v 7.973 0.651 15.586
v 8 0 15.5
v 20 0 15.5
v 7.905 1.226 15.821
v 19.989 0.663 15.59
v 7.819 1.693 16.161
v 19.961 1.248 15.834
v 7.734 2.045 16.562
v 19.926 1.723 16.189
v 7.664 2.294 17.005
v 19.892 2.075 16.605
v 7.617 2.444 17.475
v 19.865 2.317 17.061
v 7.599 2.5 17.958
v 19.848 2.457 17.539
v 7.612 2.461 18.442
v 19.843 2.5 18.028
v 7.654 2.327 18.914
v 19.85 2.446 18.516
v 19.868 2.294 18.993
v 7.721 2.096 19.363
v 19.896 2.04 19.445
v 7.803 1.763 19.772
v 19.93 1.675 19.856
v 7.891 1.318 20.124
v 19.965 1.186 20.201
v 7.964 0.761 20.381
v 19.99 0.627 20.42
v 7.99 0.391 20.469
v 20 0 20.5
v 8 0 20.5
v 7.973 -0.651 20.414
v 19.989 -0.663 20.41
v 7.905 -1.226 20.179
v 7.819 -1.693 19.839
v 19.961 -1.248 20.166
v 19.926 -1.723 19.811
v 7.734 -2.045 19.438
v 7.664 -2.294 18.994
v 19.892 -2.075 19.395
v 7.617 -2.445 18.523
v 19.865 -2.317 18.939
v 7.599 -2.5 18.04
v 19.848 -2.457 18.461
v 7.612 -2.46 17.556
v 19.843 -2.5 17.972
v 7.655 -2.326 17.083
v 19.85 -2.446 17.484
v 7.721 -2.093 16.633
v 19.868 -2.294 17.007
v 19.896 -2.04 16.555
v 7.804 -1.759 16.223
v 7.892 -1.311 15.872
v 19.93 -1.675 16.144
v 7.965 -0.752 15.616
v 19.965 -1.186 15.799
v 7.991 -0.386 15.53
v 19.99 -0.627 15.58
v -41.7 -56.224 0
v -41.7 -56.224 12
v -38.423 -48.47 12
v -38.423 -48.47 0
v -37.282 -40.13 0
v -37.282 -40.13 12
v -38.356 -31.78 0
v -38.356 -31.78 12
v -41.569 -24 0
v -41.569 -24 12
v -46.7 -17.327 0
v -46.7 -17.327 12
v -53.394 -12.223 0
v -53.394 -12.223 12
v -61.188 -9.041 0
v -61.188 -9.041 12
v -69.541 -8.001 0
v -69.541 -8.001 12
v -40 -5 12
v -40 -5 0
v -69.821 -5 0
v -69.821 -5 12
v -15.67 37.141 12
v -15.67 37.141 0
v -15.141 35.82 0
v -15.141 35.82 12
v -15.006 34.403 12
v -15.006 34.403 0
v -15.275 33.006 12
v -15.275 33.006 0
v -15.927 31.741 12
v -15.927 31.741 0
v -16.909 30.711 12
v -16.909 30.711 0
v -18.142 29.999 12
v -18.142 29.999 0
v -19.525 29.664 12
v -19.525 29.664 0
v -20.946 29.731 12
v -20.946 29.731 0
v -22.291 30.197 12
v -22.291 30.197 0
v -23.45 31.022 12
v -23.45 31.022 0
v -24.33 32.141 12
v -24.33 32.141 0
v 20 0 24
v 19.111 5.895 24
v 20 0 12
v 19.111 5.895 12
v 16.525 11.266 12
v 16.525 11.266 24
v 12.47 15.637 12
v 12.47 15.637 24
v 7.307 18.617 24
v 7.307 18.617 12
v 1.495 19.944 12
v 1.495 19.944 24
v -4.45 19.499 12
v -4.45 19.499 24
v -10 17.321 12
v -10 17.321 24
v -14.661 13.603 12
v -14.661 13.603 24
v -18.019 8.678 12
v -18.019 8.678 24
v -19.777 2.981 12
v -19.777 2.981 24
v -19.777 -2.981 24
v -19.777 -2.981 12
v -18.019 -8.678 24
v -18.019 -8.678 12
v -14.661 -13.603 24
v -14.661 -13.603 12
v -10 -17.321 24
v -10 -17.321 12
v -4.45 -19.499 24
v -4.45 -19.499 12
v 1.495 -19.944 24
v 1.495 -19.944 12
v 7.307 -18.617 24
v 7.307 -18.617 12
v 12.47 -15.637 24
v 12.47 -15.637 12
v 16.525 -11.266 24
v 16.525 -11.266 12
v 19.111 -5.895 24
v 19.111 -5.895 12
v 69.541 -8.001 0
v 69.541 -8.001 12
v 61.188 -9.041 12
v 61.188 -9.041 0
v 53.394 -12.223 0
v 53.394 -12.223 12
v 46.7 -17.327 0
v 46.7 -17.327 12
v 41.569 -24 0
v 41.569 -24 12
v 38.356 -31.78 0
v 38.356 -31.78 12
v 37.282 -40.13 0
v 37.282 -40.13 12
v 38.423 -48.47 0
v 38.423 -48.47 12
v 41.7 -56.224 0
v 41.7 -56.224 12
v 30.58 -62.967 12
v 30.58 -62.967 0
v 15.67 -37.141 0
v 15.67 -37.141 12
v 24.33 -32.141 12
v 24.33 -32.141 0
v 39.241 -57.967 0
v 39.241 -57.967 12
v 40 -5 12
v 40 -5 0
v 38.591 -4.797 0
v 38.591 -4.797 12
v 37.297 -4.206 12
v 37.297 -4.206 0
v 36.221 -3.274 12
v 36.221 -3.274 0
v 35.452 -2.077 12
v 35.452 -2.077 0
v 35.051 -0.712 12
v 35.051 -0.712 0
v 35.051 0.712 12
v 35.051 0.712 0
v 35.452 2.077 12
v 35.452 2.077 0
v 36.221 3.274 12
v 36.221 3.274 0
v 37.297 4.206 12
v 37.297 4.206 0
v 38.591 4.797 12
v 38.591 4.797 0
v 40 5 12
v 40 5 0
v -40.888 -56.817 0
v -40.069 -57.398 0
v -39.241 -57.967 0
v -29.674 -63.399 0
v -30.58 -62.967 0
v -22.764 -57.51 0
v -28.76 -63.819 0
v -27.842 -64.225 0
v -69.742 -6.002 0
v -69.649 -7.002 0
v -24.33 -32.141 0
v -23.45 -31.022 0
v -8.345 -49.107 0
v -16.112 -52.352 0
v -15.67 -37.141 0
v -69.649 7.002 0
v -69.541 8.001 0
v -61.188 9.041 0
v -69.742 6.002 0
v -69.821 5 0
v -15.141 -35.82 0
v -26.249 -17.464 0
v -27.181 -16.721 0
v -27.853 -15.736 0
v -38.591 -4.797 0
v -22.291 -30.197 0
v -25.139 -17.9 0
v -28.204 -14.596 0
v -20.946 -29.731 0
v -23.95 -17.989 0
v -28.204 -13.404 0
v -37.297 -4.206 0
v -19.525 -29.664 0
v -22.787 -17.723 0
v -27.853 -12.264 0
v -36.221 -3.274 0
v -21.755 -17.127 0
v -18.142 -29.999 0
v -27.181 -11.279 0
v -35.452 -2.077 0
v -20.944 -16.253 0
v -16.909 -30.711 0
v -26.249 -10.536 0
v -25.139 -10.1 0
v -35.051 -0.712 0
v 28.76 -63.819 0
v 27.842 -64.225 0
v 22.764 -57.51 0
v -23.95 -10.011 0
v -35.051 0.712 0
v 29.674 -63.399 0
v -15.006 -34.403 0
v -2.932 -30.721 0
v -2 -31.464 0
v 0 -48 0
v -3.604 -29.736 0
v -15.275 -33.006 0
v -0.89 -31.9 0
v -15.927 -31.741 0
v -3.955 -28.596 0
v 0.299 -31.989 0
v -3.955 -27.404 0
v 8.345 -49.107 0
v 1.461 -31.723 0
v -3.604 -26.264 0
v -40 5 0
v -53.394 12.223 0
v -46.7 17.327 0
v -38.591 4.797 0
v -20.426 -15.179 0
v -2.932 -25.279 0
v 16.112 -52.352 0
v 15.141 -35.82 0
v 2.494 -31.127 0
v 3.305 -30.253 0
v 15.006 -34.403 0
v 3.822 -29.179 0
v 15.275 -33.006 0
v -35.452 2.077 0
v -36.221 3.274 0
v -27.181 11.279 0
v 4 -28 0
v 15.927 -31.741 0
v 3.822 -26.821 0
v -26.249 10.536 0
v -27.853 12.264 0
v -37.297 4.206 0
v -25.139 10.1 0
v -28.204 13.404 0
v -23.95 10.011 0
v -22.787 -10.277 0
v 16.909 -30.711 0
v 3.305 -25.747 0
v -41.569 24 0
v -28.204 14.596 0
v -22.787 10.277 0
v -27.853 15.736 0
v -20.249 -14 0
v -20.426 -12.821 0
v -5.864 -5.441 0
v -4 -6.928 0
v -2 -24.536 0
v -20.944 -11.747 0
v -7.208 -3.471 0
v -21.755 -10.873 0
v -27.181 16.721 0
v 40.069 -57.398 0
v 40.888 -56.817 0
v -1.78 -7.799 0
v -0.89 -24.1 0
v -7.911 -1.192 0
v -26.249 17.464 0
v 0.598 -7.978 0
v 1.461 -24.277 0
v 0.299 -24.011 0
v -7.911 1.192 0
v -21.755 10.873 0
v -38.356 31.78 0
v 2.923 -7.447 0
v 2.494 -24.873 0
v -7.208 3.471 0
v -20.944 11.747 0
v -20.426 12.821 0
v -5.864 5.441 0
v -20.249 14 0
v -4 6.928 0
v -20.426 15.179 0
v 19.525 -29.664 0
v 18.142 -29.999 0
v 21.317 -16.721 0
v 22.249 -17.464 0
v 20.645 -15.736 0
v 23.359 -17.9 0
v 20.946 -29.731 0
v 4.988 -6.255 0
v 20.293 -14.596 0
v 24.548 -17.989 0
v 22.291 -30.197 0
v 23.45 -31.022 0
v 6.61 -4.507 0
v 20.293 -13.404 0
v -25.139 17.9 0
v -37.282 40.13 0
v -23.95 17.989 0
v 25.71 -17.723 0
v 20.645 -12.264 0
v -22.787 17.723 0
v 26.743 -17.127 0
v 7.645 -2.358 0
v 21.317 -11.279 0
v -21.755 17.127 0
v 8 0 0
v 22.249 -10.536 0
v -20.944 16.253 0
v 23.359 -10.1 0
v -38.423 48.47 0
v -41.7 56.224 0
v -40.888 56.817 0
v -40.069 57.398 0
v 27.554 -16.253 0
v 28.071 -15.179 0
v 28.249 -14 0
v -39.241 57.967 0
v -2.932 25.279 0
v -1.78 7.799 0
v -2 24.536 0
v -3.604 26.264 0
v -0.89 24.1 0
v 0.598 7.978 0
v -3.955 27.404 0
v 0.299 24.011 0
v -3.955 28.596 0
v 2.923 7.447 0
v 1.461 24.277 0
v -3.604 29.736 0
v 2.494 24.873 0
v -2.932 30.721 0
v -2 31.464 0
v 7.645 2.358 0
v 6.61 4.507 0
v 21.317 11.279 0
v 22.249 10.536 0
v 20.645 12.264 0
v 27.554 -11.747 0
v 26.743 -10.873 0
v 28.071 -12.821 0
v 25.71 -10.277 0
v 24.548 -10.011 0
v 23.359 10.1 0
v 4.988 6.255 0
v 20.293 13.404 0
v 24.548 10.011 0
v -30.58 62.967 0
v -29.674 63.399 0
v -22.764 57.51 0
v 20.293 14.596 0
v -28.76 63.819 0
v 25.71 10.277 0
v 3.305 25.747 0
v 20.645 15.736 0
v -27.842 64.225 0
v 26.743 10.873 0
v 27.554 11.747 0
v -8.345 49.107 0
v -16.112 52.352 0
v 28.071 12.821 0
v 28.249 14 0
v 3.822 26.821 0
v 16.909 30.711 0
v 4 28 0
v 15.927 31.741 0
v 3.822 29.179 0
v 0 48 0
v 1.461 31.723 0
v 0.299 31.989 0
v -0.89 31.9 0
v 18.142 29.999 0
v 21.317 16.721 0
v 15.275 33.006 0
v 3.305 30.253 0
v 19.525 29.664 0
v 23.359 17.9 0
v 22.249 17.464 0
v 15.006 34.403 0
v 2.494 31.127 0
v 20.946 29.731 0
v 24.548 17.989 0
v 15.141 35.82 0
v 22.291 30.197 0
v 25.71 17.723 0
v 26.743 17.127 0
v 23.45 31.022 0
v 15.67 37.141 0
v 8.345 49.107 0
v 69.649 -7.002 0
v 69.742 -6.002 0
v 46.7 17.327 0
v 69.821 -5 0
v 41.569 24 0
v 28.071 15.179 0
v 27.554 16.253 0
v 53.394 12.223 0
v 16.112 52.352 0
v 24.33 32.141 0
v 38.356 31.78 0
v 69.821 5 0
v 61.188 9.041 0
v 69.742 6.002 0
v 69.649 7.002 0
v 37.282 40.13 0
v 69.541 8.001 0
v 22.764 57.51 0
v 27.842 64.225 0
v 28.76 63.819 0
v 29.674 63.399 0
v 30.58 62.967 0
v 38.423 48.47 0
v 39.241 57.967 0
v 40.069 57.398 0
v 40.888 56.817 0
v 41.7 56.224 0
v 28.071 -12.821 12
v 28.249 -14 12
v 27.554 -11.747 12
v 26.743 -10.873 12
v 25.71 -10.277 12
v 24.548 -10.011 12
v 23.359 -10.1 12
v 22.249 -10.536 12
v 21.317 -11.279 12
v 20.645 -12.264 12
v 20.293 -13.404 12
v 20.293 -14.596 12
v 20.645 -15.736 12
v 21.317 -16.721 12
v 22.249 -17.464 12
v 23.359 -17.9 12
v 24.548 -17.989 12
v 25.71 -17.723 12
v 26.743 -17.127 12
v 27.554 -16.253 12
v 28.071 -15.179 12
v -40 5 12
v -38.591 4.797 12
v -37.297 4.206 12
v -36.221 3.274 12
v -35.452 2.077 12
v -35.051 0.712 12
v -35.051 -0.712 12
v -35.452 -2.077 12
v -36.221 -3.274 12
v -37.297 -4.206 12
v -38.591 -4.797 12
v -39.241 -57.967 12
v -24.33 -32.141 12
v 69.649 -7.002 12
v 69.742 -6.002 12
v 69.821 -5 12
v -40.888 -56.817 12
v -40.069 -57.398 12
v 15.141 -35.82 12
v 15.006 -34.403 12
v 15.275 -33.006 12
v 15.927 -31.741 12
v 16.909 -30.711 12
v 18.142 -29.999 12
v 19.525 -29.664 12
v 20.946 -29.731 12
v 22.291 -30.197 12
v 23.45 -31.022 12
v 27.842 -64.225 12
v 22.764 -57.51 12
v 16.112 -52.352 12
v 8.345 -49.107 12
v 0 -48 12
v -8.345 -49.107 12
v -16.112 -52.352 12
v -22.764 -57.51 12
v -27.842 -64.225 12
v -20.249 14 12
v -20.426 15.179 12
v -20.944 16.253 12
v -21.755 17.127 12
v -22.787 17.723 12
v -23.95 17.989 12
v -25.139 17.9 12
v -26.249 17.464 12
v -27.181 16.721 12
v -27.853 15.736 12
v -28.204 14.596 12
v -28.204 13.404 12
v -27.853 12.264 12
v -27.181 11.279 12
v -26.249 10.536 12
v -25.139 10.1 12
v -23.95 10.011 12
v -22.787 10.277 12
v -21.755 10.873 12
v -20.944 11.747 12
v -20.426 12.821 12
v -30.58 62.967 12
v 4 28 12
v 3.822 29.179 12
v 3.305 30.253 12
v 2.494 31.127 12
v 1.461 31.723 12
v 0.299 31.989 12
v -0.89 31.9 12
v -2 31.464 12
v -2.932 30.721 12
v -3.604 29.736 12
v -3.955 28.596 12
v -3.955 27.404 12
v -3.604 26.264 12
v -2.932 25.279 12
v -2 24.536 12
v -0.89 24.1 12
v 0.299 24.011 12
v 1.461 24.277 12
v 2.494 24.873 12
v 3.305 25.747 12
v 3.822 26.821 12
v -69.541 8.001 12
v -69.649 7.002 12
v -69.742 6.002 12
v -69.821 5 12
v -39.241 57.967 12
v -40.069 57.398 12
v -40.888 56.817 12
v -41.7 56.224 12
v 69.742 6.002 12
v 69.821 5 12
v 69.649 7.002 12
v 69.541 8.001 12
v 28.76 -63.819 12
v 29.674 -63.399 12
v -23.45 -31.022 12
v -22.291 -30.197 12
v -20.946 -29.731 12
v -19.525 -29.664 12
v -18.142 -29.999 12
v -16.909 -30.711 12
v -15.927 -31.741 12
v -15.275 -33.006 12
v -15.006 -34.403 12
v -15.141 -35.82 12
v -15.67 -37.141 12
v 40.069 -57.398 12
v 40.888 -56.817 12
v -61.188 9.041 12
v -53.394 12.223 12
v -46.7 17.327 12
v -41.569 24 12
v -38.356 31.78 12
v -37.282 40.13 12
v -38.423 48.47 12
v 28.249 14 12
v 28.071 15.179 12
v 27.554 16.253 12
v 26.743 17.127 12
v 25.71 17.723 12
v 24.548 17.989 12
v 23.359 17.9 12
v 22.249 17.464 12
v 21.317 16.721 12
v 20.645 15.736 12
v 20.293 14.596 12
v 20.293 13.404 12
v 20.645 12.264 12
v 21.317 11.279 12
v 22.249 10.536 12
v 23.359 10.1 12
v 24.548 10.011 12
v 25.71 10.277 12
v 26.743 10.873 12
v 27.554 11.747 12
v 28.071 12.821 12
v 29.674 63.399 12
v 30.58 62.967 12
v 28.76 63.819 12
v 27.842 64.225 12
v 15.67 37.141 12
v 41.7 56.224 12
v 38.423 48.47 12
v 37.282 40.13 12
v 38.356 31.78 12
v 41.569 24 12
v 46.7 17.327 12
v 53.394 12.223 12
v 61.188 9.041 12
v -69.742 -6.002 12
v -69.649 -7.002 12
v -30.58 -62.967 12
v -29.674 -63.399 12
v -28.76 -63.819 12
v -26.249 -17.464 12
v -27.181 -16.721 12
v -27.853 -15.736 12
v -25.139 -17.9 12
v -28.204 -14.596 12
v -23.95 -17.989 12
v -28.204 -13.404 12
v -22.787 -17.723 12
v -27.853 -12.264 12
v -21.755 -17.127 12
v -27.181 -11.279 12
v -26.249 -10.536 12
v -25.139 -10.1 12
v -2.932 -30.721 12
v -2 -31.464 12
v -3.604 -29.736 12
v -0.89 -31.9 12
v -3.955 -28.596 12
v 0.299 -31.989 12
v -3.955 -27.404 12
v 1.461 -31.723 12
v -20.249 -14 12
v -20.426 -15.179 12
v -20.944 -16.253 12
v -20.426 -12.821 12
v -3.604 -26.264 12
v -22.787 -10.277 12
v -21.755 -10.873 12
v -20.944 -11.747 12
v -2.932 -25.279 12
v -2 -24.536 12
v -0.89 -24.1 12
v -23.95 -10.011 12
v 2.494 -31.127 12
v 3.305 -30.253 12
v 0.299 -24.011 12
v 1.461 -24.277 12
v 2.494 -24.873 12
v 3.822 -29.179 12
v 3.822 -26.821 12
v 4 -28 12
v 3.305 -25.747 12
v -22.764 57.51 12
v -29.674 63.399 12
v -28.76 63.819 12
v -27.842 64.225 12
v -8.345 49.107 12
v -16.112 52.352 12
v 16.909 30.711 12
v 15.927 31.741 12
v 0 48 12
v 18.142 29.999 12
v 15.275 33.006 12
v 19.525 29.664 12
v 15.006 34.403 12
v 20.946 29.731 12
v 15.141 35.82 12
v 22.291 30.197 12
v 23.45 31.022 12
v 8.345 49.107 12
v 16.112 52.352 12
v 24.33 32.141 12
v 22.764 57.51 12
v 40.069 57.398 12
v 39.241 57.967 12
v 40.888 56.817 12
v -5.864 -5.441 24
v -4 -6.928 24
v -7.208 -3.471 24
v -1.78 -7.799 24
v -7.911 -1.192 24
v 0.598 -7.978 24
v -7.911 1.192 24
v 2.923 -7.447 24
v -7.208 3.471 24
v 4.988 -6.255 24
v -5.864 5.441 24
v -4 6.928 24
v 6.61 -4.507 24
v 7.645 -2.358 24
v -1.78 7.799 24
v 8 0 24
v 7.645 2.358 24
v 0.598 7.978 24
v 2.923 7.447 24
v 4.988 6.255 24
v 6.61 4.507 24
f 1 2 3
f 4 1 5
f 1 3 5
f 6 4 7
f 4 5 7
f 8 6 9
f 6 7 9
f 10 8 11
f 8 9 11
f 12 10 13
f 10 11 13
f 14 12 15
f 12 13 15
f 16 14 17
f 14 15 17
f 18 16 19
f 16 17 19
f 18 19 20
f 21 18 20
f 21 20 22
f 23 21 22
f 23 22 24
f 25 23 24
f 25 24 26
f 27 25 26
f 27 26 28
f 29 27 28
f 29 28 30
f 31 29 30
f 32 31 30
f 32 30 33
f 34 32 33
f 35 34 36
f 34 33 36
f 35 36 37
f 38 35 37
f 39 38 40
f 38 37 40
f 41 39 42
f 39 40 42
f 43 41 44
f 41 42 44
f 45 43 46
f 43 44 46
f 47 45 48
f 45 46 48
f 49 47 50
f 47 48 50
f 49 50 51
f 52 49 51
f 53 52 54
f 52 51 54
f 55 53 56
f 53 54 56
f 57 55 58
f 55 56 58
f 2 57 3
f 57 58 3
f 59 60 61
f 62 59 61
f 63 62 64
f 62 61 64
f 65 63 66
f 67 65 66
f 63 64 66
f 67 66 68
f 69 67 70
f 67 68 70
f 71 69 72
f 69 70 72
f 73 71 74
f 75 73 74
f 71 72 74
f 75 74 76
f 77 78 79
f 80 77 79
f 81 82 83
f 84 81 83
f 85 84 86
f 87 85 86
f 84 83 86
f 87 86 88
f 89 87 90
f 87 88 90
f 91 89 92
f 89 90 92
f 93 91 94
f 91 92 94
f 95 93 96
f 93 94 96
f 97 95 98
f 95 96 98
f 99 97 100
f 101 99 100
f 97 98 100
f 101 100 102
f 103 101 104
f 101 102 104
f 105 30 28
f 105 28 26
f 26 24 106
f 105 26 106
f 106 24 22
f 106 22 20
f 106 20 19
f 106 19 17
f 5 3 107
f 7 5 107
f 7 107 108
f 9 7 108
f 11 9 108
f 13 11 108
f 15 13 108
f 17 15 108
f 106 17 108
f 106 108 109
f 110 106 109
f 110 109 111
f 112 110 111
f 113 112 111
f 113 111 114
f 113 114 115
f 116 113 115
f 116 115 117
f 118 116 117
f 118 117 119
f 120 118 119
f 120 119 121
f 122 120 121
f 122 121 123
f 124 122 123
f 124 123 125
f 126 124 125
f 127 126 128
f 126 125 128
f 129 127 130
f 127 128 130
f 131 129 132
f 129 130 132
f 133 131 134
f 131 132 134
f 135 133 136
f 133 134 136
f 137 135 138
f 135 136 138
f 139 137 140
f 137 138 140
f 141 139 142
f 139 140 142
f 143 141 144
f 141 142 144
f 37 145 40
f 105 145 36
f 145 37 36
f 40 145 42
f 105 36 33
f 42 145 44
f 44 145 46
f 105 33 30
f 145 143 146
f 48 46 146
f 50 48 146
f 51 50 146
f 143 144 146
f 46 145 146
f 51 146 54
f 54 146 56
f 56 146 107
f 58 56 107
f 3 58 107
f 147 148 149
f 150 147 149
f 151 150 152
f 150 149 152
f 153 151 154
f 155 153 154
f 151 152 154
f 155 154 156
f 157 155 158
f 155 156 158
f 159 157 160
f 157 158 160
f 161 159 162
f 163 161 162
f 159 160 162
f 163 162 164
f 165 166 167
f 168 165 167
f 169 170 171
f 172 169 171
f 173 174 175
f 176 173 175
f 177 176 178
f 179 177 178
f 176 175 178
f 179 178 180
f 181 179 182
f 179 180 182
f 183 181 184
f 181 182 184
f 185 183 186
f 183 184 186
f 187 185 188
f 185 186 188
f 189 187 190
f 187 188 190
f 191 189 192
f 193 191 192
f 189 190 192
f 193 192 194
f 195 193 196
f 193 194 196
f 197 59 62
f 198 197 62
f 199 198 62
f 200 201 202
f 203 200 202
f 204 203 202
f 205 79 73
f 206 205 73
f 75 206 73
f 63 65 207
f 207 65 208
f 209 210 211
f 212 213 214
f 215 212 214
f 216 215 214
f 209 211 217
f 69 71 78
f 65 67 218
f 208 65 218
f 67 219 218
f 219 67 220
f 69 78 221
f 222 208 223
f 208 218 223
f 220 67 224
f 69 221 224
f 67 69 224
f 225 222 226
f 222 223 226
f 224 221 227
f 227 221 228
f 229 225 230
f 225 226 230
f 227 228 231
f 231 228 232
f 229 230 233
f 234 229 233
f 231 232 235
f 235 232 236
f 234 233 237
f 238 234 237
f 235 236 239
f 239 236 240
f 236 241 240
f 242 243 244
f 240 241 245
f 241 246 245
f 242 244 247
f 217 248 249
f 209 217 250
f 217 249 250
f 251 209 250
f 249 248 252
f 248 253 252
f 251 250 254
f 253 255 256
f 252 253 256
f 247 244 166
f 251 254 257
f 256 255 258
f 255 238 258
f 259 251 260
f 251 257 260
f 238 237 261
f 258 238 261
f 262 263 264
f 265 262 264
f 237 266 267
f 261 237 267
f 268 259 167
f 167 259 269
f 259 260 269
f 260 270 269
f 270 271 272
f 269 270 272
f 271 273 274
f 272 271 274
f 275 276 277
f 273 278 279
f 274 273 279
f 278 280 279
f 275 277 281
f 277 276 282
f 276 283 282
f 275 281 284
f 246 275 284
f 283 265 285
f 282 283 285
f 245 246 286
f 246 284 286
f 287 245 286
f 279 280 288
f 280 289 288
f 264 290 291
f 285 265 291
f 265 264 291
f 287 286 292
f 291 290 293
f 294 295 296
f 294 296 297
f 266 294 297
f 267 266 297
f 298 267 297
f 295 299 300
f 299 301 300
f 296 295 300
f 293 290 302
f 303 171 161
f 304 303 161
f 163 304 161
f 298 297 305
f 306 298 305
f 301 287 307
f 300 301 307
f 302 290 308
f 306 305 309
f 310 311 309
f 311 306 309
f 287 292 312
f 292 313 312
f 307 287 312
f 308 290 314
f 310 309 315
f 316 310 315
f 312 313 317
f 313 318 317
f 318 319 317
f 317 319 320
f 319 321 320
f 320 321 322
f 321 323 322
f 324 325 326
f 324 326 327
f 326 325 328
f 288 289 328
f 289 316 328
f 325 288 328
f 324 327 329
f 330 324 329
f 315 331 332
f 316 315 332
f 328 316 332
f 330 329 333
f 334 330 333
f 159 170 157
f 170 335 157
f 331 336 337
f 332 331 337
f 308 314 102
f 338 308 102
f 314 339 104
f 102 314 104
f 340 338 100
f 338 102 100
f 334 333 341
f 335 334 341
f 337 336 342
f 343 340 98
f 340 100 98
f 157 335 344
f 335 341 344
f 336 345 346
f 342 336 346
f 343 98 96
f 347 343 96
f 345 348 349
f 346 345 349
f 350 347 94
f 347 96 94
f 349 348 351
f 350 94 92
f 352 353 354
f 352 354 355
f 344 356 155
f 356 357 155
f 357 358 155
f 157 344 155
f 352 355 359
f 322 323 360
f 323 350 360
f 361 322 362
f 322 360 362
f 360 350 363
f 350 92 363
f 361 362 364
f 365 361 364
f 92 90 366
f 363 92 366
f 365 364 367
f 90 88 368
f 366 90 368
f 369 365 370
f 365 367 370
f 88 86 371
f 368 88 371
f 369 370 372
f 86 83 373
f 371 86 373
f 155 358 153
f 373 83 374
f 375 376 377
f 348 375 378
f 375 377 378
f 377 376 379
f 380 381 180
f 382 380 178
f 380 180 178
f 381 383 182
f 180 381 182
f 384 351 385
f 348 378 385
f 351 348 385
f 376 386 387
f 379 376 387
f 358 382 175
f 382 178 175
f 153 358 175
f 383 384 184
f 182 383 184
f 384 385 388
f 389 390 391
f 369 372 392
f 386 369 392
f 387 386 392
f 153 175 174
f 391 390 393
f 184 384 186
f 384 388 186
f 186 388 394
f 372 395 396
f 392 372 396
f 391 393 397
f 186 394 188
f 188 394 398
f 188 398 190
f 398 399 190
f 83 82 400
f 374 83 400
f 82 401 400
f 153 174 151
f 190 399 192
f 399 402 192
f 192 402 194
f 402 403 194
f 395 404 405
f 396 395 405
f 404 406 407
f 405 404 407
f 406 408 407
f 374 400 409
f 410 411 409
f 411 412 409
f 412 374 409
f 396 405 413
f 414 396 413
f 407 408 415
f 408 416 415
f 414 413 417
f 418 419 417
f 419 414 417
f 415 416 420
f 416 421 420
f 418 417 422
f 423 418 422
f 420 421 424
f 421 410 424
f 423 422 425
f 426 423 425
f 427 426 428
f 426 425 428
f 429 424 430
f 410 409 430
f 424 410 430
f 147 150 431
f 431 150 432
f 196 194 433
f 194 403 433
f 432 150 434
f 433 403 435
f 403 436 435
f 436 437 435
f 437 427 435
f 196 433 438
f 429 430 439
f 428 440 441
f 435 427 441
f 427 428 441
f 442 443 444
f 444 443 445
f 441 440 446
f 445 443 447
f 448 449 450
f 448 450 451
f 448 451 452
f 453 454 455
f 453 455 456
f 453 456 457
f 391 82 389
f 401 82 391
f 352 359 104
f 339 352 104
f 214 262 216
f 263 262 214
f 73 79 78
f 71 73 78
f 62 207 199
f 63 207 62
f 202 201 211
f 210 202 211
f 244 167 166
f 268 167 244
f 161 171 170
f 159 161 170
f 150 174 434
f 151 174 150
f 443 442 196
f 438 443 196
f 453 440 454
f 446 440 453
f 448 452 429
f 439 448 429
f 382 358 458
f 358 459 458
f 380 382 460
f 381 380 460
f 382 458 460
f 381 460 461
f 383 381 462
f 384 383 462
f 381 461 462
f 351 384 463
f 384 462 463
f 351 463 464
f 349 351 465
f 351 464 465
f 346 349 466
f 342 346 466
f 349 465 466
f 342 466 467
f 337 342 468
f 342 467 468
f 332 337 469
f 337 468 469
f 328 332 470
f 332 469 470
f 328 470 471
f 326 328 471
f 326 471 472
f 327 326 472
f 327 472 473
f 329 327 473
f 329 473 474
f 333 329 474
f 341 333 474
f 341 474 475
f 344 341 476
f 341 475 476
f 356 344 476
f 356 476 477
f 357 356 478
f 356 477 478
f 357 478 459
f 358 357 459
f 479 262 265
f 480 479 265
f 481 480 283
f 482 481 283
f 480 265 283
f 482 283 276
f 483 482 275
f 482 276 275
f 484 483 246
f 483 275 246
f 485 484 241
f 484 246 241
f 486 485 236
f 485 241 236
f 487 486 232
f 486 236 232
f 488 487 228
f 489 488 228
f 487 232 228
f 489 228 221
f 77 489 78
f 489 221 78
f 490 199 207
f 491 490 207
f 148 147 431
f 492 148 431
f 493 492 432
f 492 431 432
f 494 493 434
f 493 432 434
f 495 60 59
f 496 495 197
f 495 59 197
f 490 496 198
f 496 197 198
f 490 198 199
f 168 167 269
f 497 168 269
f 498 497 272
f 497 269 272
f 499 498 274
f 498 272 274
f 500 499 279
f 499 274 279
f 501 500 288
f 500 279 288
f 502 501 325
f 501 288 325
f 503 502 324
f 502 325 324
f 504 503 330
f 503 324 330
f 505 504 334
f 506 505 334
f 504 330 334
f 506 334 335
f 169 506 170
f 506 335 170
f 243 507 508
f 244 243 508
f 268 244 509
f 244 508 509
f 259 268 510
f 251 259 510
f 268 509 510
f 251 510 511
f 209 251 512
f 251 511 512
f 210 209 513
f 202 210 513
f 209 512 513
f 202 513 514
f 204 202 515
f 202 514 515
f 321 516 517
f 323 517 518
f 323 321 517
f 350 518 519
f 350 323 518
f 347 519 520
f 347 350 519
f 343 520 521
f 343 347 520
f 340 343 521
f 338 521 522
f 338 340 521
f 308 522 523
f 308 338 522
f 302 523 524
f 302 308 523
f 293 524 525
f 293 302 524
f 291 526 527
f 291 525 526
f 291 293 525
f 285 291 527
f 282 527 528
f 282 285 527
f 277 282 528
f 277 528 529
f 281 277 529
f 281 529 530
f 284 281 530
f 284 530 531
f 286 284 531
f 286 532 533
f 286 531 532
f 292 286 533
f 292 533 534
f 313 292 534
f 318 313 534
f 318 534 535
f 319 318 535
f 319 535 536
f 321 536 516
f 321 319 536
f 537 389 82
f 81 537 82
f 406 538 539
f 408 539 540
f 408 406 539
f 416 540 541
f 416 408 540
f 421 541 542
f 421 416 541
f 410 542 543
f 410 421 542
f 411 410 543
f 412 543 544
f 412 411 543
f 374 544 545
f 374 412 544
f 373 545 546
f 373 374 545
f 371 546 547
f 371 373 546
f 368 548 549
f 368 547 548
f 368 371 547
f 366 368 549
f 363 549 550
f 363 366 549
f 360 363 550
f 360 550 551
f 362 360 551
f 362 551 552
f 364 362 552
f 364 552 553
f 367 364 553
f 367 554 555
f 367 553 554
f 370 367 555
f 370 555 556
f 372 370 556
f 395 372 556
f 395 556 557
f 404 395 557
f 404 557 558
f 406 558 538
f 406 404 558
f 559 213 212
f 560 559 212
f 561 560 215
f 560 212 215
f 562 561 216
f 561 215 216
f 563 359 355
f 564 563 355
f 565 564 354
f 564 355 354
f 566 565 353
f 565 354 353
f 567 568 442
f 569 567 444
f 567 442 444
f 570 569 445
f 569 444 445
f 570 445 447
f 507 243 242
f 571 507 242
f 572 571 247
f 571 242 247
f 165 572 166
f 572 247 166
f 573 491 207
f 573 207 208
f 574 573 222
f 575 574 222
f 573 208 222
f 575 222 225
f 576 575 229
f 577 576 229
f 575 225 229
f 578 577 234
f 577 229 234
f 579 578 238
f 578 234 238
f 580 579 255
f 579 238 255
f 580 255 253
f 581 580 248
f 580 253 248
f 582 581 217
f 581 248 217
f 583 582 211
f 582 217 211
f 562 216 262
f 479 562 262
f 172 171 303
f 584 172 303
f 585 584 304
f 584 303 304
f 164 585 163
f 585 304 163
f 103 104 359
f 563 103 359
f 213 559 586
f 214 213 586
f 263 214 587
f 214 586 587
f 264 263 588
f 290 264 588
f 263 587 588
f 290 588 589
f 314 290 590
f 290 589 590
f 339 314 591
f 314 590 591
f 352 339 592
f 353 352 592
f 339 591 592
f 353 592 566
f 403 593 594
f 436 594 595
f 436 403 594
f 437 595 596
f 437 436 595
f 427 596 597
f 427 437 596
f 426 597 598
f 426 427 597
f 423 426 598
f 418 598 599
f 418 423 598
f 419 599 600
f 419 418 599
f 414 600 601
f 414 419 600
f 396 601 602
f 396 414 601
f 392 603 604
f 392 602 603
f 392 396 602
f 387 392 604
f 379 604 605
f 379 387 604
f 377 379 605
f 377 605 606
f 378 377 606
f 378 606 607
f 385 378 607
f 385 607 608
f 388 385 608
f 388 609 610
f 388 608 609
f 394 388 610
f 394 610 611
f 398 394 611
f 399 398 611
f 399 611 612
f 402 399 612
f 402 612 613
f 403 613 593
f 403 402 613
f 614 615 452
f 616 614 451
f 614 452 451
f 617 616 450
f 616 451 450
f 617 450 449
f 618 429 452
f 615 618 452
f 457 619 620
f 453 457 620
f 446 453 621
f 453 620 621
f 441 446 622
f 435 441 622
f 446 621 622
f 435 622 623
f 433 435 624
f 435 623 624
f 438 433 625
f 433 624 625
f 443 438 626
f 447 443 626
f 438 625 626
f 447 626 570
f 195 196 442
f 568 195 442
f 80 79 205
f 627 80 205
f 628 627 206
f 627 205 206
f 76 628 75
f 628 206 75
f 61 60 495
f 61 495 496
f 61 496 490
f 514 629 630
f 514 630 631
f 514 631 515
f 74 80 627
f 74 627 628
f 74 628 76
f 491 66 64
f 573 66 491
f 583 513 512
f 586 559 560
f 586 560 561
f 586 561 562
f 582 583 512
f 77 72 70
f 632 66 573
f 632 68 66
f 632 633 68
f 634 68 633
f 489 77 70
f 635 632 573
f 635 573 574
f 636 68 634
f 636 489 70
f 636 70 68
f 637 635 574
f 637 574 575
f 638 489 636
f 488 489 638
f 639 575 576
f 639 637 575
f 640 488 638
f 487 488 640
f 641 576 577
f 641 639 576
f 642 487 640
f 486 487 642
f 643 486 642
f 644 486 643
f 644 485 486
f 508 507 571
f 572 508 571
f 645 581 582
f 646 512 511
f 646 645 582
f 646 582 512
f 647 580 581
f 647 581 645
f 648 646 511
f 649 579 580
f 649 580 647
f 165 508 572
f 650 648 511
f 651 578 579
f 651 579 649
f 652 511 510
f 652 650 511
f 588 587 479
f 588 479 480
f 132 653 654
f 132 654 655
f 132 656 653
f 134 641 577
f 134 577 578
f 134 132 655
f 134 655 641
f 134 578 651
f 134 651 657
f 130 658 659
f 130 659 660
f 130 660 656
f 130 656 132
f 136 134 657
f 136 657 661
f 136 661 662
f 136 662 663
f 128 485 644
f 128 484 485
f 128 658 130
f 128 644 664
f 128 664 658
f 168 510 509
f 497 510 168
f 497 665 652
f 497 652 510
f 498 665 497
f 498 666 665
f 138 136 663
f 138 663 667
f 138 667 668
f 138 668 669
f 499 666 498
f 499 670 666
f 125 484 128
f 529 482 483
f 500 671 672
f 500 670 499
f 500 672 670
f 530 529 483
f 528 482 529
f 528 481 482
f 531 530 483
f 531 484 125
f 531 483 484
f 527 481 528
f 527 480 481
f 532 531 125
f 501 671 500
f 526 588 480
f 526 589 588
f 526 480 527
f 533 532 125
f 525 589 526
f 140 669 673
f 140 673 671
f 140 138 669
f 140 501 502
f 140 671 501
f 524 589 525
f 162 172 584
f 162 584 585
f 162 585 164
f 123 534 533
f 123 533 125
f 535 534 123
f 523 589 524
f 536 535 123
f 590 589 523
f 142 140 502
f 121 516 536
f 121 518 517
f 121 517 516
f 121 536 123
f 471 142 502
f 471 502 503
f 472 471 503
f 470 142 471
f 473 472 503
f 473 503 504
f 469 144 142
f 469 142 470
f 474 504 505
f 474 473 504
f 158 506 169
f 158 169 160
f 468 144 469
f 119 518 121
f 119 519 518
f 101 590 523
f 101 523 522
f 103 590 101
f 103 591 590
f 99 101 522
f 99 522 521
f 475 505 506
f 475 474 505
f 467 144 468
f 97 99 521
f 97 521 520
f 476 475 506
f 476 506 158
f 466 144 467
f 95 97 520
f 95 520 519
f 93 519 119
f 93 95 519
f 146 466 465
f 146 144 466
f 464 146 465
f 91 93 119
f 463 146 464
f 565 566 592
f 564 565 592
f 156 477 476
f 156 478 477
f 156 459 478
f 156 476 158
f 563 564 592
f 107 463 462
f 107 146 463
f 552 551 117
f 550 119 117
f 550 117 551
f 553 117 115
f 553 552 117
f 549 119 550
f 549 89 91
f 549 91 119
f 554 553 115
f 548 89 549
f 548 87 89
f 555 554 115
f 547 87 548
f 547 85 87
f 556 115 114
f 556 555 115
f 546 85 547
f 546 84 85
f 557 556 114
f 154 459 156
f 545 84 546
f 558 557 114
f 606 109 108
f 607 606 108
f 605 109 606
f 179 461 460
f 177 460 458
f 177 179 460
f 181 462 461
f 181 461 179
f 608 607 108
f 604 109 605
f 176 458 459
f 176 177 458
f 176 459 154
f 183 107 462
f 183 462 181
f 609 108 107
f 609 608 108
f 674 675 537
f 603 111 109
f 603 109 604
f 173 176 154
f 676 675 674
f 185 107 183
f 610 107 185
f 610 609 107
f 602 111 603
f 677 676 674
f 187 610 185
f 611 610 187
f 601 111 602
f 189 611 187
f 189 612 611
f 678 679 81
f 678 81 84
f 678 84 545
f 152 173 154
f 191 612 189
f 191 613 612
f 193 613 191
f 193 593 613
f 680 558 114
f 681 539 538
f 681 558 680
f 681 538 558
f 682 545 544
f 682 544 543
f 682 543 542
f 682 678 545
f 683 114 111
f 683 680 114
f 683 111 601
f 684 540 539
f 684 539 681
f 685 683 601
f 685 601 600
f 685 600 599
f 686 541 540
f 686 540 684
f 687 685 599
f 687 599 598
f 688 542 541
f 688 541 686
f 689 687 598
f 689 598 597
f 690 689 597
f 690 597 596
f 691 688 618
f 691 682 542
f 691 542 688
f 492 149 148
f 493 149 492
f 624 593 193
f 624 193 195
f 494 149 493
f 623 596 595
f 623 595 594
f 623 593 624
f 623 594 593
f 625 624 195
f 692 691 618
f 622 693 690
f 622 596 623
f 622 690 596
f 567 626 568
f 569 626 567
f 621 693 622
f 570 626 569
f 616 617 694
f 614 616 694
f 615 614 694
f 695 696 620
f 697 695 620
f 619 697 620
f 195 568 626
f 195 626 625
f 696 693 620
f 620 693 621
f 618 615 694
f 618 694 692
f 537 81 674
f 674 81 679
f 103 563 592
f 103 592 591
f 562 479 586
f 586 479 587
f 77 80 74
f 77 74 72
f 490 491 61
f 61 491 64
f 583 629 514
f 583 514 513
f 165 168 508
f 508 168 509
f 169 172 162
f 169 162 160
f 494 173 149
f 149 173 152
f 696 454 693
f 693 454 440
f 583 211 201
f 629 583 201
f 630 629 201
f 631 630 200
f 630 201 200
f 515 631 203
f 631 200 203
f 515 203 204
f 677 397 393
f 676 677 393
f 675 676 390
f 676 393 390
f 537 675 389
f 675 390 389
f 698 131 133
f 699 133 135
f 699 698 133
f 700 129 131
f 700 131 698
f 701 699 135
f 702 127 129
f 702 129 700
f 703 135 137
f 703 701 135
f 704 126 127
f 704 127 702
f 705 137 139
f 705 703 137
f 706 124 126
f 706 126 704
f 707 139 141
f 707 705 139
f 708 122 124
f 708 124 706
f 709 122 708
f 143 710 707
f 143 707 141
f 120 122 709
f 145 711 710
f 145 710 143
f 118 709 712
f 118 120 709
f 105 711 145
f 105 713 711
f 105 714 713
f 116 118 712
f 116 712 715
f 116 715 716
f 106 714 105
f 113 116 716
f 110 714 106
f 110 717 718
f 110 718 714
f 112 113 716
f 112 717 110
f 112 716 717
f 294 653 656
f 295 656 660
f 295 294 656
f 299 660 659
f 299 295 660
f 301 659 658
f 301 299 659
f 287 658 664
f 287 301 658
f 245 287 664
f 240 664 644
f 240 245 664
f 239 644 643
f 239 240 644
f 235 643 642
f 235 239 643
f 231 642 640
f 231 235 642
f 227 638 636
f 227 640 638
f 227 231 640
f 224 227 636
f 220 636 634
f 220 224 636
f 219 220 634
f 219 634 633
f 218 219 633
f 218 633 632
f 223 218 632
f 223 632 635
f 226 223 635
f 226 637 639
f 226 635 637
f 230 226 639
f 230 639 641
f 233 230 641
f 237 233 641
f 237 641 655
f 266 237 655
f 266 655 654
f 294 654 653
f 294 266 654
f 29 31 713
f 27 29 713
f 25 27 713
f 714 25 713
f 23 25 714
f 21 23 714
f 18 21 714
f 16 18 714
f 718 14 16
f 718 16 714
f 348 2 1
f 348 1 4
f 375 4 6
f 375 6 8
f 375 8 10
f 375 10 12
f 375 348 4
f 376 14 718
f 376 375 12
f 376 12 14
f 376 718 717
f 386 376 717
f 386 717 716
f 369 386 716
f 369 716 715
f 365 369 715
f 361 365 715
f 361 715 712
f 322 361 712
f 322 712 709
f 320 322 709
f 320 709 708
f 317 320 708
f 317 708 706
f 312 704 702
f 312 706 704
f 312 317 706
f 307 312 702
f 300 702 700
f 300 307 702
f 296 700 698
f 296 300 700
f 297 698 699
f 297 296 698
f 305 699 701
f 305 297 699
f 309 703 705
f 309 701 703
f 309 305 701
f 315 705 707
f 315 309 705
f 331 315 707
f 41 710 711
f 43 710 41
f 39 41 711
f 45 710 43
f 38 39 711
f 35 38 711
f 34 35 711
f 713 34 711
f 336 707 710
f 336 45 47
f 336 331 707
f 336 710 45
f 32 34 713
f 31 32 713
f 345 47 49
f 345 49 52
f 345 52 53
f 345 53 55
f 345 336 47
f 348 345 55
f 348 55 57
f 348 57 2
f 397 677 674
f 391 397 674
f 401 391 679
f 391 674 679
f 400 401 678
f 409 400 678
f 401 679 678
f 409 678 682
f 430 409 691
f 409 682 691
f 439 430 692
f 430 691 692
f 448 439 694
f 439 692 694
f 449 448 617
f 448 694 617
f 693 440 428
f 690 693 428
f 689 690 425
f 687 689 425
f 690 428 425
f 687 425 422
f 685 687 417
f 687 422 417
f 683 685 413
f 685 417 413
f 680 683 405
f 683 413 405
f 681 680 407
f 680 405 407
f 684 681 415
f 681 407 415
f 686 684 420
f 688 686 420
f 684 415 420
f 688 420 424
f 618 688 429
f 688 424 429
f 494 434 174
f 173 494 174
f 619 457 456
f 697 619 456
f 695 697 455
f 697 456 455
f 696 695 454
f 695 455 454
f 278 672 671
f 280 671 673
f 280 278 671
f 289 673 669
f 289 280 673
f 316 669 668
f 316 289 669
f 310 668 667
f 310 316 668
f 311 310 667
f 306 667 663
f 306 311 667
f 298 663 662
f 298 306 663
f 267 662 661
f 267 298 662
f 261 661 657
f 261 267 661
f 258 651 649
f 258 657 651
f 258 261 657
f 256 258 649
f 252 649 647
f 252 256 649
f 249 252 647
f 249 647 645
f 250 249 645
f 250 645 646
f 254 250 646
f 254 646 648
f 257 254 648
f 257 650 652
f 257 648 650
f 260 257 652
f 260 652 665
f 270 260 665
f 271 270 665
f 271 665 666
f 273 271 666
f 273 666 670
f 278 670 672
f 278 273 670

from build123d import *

# Parameters (mm, degrees)
SKETCH_1_R               = 70
EXTRUDE_1_DEPTH          = 12
SKETCH_2_R               = 20
EXTRUDE_2_DEPTH          = 12
SKETCH_3_R               = 8
CUT_EXTRUDE_1_DEPTH      = 102.862652626
CUT_EXTRUDE_2_DEPTH      = 102.862652626
PATTERN_CIRCULAR_1_COUNT = 6
SKETCH_5_R               = 32
CUT_EXTRUDE_3_DEPTH      = 141
PATTERN_CIRCULAR_2_COUNT = 6
SKETCH_6_R               = 4
CUT_EXTRUDE_4_DEPTH      = 140.642
SKETCH_8_R               = 2.5
CUT_EXTRUDE_7_DEPTH      = 13


with BuildPart() as part:
    # 草图1 → 凸台-拉伸1 (new body)
    with BuildSketch(Plane.XY):
        Circle(SKETCH_1_R)
    extrude(amount=EXTRUDE_1_DEPTH)

    # 草图2 → 凸台-拉伸2 (add)
    with BuildSketch(Plane.XY.offset(12)):
        Circle(SKETCH_2_R)
    extrude(amount=EXTRUDE_2_DEPTH)

    # 草图3 → 切除-拉伸1 (cut, through all)
    with BuildSketch(Plane.XY):
        Circle(SKETCH_3_R)
    extrude(amount=CUT_EXTRUDE_1_DEPTH, mode=Mode.SUBTRACT)

    # 草图4 → 切除-拉伸2 (cut, through all)
    with BuildSketch(Plane.XY):
        with BuildLine():
            Line((75, -5), (40, -5))
            ThreePointArc((40, -5), (35, 0), (40, 5))
            Line((40, 5), (75, 5))
            Line((75, 5), (75, -5))
        make_face()
    cut_extrude_2 = extrude(amount=CUT_EXTRUDE_2_DEPTH, mode=Mode.SUBTRACT)

    # 阵列(圆周)1: 切除-拉伸2 ×6 about axis
    pattern_circular_1_axis = Axis((0, 0, 25.2), (0, 0, -1))
    for i in range(1, PATTERN_CIRCULAR_1_COUNT):
        add(cut_extrude_2.rotate(pattern_circular_1_axis, i * 360 / PATTERN_CIRCULAR_1_COUNT), mode=Mode.SUBTRACT)

    # 草图5 → 切除-拉伸3 (cut, symmetric)
    with BuildSketch(Plane.XY):
        with Locations((69.282, 40)):
            Circle(SKETCH_5_R)
    cut_extrude_3 = extrude(amount=CUT_EXTRUDE_3_DEPTH, both=True, mode=Mode.SUBTRACT)

    # 阵列(圆周)2: 切除-拉伸3 ×6 about axis
    pattern_circular_2_axis = Axis((0, 0, 25.2), (0, 0, -1))
    for i in range(1, PATTERN_CIRCULAR_2_COUNT):
        add(cut_extrude_3.rotate(pattern_circular_2_axis, i * 360 / PATTERN_CIRCULAR_2_COUNT), mode=Mode.SUBTRACT)

    # 草图6 → 切除-拉伸4 (cut, symmetric)
    with BuildSketch(Plane.XY):
        with Locations((24.248711, 14)):
            Circle(SKETCH_6_R)
        with Locations((0, 28)):
            Circle(SKETCH_6_R)
        with Locations((-24.248711, 14)):
            Circle(SKETCH_6_R)
        with Locations((-24.248711, -14)):
            Circle(SKETCH_6_R)
        with Locations((0, -28)):
            Circle(SKETCH_6_R)
        with Locations((24.248711, -14)):
            Circle(SKETCH_6_R)
    extrude(amount=CUT_EXTRUDE_4_DEPTH, both=True, mode=Mode.SUBTRACT)

    # 草图8 → 切除-拉伸7 (cut)
    with BuildSketch(Plane(origin=(20, 0, 0), x_dir=(0, 0, -1), z_dir=(1, 0, 0))):
        with Locations((-18, 0)):
            Circle(SKETCH_8_R)
    extrude(amount=-CUT_EXTRUDE_7_DEPTH, mode=Mode.SUBTRACT)


solid = part.part
